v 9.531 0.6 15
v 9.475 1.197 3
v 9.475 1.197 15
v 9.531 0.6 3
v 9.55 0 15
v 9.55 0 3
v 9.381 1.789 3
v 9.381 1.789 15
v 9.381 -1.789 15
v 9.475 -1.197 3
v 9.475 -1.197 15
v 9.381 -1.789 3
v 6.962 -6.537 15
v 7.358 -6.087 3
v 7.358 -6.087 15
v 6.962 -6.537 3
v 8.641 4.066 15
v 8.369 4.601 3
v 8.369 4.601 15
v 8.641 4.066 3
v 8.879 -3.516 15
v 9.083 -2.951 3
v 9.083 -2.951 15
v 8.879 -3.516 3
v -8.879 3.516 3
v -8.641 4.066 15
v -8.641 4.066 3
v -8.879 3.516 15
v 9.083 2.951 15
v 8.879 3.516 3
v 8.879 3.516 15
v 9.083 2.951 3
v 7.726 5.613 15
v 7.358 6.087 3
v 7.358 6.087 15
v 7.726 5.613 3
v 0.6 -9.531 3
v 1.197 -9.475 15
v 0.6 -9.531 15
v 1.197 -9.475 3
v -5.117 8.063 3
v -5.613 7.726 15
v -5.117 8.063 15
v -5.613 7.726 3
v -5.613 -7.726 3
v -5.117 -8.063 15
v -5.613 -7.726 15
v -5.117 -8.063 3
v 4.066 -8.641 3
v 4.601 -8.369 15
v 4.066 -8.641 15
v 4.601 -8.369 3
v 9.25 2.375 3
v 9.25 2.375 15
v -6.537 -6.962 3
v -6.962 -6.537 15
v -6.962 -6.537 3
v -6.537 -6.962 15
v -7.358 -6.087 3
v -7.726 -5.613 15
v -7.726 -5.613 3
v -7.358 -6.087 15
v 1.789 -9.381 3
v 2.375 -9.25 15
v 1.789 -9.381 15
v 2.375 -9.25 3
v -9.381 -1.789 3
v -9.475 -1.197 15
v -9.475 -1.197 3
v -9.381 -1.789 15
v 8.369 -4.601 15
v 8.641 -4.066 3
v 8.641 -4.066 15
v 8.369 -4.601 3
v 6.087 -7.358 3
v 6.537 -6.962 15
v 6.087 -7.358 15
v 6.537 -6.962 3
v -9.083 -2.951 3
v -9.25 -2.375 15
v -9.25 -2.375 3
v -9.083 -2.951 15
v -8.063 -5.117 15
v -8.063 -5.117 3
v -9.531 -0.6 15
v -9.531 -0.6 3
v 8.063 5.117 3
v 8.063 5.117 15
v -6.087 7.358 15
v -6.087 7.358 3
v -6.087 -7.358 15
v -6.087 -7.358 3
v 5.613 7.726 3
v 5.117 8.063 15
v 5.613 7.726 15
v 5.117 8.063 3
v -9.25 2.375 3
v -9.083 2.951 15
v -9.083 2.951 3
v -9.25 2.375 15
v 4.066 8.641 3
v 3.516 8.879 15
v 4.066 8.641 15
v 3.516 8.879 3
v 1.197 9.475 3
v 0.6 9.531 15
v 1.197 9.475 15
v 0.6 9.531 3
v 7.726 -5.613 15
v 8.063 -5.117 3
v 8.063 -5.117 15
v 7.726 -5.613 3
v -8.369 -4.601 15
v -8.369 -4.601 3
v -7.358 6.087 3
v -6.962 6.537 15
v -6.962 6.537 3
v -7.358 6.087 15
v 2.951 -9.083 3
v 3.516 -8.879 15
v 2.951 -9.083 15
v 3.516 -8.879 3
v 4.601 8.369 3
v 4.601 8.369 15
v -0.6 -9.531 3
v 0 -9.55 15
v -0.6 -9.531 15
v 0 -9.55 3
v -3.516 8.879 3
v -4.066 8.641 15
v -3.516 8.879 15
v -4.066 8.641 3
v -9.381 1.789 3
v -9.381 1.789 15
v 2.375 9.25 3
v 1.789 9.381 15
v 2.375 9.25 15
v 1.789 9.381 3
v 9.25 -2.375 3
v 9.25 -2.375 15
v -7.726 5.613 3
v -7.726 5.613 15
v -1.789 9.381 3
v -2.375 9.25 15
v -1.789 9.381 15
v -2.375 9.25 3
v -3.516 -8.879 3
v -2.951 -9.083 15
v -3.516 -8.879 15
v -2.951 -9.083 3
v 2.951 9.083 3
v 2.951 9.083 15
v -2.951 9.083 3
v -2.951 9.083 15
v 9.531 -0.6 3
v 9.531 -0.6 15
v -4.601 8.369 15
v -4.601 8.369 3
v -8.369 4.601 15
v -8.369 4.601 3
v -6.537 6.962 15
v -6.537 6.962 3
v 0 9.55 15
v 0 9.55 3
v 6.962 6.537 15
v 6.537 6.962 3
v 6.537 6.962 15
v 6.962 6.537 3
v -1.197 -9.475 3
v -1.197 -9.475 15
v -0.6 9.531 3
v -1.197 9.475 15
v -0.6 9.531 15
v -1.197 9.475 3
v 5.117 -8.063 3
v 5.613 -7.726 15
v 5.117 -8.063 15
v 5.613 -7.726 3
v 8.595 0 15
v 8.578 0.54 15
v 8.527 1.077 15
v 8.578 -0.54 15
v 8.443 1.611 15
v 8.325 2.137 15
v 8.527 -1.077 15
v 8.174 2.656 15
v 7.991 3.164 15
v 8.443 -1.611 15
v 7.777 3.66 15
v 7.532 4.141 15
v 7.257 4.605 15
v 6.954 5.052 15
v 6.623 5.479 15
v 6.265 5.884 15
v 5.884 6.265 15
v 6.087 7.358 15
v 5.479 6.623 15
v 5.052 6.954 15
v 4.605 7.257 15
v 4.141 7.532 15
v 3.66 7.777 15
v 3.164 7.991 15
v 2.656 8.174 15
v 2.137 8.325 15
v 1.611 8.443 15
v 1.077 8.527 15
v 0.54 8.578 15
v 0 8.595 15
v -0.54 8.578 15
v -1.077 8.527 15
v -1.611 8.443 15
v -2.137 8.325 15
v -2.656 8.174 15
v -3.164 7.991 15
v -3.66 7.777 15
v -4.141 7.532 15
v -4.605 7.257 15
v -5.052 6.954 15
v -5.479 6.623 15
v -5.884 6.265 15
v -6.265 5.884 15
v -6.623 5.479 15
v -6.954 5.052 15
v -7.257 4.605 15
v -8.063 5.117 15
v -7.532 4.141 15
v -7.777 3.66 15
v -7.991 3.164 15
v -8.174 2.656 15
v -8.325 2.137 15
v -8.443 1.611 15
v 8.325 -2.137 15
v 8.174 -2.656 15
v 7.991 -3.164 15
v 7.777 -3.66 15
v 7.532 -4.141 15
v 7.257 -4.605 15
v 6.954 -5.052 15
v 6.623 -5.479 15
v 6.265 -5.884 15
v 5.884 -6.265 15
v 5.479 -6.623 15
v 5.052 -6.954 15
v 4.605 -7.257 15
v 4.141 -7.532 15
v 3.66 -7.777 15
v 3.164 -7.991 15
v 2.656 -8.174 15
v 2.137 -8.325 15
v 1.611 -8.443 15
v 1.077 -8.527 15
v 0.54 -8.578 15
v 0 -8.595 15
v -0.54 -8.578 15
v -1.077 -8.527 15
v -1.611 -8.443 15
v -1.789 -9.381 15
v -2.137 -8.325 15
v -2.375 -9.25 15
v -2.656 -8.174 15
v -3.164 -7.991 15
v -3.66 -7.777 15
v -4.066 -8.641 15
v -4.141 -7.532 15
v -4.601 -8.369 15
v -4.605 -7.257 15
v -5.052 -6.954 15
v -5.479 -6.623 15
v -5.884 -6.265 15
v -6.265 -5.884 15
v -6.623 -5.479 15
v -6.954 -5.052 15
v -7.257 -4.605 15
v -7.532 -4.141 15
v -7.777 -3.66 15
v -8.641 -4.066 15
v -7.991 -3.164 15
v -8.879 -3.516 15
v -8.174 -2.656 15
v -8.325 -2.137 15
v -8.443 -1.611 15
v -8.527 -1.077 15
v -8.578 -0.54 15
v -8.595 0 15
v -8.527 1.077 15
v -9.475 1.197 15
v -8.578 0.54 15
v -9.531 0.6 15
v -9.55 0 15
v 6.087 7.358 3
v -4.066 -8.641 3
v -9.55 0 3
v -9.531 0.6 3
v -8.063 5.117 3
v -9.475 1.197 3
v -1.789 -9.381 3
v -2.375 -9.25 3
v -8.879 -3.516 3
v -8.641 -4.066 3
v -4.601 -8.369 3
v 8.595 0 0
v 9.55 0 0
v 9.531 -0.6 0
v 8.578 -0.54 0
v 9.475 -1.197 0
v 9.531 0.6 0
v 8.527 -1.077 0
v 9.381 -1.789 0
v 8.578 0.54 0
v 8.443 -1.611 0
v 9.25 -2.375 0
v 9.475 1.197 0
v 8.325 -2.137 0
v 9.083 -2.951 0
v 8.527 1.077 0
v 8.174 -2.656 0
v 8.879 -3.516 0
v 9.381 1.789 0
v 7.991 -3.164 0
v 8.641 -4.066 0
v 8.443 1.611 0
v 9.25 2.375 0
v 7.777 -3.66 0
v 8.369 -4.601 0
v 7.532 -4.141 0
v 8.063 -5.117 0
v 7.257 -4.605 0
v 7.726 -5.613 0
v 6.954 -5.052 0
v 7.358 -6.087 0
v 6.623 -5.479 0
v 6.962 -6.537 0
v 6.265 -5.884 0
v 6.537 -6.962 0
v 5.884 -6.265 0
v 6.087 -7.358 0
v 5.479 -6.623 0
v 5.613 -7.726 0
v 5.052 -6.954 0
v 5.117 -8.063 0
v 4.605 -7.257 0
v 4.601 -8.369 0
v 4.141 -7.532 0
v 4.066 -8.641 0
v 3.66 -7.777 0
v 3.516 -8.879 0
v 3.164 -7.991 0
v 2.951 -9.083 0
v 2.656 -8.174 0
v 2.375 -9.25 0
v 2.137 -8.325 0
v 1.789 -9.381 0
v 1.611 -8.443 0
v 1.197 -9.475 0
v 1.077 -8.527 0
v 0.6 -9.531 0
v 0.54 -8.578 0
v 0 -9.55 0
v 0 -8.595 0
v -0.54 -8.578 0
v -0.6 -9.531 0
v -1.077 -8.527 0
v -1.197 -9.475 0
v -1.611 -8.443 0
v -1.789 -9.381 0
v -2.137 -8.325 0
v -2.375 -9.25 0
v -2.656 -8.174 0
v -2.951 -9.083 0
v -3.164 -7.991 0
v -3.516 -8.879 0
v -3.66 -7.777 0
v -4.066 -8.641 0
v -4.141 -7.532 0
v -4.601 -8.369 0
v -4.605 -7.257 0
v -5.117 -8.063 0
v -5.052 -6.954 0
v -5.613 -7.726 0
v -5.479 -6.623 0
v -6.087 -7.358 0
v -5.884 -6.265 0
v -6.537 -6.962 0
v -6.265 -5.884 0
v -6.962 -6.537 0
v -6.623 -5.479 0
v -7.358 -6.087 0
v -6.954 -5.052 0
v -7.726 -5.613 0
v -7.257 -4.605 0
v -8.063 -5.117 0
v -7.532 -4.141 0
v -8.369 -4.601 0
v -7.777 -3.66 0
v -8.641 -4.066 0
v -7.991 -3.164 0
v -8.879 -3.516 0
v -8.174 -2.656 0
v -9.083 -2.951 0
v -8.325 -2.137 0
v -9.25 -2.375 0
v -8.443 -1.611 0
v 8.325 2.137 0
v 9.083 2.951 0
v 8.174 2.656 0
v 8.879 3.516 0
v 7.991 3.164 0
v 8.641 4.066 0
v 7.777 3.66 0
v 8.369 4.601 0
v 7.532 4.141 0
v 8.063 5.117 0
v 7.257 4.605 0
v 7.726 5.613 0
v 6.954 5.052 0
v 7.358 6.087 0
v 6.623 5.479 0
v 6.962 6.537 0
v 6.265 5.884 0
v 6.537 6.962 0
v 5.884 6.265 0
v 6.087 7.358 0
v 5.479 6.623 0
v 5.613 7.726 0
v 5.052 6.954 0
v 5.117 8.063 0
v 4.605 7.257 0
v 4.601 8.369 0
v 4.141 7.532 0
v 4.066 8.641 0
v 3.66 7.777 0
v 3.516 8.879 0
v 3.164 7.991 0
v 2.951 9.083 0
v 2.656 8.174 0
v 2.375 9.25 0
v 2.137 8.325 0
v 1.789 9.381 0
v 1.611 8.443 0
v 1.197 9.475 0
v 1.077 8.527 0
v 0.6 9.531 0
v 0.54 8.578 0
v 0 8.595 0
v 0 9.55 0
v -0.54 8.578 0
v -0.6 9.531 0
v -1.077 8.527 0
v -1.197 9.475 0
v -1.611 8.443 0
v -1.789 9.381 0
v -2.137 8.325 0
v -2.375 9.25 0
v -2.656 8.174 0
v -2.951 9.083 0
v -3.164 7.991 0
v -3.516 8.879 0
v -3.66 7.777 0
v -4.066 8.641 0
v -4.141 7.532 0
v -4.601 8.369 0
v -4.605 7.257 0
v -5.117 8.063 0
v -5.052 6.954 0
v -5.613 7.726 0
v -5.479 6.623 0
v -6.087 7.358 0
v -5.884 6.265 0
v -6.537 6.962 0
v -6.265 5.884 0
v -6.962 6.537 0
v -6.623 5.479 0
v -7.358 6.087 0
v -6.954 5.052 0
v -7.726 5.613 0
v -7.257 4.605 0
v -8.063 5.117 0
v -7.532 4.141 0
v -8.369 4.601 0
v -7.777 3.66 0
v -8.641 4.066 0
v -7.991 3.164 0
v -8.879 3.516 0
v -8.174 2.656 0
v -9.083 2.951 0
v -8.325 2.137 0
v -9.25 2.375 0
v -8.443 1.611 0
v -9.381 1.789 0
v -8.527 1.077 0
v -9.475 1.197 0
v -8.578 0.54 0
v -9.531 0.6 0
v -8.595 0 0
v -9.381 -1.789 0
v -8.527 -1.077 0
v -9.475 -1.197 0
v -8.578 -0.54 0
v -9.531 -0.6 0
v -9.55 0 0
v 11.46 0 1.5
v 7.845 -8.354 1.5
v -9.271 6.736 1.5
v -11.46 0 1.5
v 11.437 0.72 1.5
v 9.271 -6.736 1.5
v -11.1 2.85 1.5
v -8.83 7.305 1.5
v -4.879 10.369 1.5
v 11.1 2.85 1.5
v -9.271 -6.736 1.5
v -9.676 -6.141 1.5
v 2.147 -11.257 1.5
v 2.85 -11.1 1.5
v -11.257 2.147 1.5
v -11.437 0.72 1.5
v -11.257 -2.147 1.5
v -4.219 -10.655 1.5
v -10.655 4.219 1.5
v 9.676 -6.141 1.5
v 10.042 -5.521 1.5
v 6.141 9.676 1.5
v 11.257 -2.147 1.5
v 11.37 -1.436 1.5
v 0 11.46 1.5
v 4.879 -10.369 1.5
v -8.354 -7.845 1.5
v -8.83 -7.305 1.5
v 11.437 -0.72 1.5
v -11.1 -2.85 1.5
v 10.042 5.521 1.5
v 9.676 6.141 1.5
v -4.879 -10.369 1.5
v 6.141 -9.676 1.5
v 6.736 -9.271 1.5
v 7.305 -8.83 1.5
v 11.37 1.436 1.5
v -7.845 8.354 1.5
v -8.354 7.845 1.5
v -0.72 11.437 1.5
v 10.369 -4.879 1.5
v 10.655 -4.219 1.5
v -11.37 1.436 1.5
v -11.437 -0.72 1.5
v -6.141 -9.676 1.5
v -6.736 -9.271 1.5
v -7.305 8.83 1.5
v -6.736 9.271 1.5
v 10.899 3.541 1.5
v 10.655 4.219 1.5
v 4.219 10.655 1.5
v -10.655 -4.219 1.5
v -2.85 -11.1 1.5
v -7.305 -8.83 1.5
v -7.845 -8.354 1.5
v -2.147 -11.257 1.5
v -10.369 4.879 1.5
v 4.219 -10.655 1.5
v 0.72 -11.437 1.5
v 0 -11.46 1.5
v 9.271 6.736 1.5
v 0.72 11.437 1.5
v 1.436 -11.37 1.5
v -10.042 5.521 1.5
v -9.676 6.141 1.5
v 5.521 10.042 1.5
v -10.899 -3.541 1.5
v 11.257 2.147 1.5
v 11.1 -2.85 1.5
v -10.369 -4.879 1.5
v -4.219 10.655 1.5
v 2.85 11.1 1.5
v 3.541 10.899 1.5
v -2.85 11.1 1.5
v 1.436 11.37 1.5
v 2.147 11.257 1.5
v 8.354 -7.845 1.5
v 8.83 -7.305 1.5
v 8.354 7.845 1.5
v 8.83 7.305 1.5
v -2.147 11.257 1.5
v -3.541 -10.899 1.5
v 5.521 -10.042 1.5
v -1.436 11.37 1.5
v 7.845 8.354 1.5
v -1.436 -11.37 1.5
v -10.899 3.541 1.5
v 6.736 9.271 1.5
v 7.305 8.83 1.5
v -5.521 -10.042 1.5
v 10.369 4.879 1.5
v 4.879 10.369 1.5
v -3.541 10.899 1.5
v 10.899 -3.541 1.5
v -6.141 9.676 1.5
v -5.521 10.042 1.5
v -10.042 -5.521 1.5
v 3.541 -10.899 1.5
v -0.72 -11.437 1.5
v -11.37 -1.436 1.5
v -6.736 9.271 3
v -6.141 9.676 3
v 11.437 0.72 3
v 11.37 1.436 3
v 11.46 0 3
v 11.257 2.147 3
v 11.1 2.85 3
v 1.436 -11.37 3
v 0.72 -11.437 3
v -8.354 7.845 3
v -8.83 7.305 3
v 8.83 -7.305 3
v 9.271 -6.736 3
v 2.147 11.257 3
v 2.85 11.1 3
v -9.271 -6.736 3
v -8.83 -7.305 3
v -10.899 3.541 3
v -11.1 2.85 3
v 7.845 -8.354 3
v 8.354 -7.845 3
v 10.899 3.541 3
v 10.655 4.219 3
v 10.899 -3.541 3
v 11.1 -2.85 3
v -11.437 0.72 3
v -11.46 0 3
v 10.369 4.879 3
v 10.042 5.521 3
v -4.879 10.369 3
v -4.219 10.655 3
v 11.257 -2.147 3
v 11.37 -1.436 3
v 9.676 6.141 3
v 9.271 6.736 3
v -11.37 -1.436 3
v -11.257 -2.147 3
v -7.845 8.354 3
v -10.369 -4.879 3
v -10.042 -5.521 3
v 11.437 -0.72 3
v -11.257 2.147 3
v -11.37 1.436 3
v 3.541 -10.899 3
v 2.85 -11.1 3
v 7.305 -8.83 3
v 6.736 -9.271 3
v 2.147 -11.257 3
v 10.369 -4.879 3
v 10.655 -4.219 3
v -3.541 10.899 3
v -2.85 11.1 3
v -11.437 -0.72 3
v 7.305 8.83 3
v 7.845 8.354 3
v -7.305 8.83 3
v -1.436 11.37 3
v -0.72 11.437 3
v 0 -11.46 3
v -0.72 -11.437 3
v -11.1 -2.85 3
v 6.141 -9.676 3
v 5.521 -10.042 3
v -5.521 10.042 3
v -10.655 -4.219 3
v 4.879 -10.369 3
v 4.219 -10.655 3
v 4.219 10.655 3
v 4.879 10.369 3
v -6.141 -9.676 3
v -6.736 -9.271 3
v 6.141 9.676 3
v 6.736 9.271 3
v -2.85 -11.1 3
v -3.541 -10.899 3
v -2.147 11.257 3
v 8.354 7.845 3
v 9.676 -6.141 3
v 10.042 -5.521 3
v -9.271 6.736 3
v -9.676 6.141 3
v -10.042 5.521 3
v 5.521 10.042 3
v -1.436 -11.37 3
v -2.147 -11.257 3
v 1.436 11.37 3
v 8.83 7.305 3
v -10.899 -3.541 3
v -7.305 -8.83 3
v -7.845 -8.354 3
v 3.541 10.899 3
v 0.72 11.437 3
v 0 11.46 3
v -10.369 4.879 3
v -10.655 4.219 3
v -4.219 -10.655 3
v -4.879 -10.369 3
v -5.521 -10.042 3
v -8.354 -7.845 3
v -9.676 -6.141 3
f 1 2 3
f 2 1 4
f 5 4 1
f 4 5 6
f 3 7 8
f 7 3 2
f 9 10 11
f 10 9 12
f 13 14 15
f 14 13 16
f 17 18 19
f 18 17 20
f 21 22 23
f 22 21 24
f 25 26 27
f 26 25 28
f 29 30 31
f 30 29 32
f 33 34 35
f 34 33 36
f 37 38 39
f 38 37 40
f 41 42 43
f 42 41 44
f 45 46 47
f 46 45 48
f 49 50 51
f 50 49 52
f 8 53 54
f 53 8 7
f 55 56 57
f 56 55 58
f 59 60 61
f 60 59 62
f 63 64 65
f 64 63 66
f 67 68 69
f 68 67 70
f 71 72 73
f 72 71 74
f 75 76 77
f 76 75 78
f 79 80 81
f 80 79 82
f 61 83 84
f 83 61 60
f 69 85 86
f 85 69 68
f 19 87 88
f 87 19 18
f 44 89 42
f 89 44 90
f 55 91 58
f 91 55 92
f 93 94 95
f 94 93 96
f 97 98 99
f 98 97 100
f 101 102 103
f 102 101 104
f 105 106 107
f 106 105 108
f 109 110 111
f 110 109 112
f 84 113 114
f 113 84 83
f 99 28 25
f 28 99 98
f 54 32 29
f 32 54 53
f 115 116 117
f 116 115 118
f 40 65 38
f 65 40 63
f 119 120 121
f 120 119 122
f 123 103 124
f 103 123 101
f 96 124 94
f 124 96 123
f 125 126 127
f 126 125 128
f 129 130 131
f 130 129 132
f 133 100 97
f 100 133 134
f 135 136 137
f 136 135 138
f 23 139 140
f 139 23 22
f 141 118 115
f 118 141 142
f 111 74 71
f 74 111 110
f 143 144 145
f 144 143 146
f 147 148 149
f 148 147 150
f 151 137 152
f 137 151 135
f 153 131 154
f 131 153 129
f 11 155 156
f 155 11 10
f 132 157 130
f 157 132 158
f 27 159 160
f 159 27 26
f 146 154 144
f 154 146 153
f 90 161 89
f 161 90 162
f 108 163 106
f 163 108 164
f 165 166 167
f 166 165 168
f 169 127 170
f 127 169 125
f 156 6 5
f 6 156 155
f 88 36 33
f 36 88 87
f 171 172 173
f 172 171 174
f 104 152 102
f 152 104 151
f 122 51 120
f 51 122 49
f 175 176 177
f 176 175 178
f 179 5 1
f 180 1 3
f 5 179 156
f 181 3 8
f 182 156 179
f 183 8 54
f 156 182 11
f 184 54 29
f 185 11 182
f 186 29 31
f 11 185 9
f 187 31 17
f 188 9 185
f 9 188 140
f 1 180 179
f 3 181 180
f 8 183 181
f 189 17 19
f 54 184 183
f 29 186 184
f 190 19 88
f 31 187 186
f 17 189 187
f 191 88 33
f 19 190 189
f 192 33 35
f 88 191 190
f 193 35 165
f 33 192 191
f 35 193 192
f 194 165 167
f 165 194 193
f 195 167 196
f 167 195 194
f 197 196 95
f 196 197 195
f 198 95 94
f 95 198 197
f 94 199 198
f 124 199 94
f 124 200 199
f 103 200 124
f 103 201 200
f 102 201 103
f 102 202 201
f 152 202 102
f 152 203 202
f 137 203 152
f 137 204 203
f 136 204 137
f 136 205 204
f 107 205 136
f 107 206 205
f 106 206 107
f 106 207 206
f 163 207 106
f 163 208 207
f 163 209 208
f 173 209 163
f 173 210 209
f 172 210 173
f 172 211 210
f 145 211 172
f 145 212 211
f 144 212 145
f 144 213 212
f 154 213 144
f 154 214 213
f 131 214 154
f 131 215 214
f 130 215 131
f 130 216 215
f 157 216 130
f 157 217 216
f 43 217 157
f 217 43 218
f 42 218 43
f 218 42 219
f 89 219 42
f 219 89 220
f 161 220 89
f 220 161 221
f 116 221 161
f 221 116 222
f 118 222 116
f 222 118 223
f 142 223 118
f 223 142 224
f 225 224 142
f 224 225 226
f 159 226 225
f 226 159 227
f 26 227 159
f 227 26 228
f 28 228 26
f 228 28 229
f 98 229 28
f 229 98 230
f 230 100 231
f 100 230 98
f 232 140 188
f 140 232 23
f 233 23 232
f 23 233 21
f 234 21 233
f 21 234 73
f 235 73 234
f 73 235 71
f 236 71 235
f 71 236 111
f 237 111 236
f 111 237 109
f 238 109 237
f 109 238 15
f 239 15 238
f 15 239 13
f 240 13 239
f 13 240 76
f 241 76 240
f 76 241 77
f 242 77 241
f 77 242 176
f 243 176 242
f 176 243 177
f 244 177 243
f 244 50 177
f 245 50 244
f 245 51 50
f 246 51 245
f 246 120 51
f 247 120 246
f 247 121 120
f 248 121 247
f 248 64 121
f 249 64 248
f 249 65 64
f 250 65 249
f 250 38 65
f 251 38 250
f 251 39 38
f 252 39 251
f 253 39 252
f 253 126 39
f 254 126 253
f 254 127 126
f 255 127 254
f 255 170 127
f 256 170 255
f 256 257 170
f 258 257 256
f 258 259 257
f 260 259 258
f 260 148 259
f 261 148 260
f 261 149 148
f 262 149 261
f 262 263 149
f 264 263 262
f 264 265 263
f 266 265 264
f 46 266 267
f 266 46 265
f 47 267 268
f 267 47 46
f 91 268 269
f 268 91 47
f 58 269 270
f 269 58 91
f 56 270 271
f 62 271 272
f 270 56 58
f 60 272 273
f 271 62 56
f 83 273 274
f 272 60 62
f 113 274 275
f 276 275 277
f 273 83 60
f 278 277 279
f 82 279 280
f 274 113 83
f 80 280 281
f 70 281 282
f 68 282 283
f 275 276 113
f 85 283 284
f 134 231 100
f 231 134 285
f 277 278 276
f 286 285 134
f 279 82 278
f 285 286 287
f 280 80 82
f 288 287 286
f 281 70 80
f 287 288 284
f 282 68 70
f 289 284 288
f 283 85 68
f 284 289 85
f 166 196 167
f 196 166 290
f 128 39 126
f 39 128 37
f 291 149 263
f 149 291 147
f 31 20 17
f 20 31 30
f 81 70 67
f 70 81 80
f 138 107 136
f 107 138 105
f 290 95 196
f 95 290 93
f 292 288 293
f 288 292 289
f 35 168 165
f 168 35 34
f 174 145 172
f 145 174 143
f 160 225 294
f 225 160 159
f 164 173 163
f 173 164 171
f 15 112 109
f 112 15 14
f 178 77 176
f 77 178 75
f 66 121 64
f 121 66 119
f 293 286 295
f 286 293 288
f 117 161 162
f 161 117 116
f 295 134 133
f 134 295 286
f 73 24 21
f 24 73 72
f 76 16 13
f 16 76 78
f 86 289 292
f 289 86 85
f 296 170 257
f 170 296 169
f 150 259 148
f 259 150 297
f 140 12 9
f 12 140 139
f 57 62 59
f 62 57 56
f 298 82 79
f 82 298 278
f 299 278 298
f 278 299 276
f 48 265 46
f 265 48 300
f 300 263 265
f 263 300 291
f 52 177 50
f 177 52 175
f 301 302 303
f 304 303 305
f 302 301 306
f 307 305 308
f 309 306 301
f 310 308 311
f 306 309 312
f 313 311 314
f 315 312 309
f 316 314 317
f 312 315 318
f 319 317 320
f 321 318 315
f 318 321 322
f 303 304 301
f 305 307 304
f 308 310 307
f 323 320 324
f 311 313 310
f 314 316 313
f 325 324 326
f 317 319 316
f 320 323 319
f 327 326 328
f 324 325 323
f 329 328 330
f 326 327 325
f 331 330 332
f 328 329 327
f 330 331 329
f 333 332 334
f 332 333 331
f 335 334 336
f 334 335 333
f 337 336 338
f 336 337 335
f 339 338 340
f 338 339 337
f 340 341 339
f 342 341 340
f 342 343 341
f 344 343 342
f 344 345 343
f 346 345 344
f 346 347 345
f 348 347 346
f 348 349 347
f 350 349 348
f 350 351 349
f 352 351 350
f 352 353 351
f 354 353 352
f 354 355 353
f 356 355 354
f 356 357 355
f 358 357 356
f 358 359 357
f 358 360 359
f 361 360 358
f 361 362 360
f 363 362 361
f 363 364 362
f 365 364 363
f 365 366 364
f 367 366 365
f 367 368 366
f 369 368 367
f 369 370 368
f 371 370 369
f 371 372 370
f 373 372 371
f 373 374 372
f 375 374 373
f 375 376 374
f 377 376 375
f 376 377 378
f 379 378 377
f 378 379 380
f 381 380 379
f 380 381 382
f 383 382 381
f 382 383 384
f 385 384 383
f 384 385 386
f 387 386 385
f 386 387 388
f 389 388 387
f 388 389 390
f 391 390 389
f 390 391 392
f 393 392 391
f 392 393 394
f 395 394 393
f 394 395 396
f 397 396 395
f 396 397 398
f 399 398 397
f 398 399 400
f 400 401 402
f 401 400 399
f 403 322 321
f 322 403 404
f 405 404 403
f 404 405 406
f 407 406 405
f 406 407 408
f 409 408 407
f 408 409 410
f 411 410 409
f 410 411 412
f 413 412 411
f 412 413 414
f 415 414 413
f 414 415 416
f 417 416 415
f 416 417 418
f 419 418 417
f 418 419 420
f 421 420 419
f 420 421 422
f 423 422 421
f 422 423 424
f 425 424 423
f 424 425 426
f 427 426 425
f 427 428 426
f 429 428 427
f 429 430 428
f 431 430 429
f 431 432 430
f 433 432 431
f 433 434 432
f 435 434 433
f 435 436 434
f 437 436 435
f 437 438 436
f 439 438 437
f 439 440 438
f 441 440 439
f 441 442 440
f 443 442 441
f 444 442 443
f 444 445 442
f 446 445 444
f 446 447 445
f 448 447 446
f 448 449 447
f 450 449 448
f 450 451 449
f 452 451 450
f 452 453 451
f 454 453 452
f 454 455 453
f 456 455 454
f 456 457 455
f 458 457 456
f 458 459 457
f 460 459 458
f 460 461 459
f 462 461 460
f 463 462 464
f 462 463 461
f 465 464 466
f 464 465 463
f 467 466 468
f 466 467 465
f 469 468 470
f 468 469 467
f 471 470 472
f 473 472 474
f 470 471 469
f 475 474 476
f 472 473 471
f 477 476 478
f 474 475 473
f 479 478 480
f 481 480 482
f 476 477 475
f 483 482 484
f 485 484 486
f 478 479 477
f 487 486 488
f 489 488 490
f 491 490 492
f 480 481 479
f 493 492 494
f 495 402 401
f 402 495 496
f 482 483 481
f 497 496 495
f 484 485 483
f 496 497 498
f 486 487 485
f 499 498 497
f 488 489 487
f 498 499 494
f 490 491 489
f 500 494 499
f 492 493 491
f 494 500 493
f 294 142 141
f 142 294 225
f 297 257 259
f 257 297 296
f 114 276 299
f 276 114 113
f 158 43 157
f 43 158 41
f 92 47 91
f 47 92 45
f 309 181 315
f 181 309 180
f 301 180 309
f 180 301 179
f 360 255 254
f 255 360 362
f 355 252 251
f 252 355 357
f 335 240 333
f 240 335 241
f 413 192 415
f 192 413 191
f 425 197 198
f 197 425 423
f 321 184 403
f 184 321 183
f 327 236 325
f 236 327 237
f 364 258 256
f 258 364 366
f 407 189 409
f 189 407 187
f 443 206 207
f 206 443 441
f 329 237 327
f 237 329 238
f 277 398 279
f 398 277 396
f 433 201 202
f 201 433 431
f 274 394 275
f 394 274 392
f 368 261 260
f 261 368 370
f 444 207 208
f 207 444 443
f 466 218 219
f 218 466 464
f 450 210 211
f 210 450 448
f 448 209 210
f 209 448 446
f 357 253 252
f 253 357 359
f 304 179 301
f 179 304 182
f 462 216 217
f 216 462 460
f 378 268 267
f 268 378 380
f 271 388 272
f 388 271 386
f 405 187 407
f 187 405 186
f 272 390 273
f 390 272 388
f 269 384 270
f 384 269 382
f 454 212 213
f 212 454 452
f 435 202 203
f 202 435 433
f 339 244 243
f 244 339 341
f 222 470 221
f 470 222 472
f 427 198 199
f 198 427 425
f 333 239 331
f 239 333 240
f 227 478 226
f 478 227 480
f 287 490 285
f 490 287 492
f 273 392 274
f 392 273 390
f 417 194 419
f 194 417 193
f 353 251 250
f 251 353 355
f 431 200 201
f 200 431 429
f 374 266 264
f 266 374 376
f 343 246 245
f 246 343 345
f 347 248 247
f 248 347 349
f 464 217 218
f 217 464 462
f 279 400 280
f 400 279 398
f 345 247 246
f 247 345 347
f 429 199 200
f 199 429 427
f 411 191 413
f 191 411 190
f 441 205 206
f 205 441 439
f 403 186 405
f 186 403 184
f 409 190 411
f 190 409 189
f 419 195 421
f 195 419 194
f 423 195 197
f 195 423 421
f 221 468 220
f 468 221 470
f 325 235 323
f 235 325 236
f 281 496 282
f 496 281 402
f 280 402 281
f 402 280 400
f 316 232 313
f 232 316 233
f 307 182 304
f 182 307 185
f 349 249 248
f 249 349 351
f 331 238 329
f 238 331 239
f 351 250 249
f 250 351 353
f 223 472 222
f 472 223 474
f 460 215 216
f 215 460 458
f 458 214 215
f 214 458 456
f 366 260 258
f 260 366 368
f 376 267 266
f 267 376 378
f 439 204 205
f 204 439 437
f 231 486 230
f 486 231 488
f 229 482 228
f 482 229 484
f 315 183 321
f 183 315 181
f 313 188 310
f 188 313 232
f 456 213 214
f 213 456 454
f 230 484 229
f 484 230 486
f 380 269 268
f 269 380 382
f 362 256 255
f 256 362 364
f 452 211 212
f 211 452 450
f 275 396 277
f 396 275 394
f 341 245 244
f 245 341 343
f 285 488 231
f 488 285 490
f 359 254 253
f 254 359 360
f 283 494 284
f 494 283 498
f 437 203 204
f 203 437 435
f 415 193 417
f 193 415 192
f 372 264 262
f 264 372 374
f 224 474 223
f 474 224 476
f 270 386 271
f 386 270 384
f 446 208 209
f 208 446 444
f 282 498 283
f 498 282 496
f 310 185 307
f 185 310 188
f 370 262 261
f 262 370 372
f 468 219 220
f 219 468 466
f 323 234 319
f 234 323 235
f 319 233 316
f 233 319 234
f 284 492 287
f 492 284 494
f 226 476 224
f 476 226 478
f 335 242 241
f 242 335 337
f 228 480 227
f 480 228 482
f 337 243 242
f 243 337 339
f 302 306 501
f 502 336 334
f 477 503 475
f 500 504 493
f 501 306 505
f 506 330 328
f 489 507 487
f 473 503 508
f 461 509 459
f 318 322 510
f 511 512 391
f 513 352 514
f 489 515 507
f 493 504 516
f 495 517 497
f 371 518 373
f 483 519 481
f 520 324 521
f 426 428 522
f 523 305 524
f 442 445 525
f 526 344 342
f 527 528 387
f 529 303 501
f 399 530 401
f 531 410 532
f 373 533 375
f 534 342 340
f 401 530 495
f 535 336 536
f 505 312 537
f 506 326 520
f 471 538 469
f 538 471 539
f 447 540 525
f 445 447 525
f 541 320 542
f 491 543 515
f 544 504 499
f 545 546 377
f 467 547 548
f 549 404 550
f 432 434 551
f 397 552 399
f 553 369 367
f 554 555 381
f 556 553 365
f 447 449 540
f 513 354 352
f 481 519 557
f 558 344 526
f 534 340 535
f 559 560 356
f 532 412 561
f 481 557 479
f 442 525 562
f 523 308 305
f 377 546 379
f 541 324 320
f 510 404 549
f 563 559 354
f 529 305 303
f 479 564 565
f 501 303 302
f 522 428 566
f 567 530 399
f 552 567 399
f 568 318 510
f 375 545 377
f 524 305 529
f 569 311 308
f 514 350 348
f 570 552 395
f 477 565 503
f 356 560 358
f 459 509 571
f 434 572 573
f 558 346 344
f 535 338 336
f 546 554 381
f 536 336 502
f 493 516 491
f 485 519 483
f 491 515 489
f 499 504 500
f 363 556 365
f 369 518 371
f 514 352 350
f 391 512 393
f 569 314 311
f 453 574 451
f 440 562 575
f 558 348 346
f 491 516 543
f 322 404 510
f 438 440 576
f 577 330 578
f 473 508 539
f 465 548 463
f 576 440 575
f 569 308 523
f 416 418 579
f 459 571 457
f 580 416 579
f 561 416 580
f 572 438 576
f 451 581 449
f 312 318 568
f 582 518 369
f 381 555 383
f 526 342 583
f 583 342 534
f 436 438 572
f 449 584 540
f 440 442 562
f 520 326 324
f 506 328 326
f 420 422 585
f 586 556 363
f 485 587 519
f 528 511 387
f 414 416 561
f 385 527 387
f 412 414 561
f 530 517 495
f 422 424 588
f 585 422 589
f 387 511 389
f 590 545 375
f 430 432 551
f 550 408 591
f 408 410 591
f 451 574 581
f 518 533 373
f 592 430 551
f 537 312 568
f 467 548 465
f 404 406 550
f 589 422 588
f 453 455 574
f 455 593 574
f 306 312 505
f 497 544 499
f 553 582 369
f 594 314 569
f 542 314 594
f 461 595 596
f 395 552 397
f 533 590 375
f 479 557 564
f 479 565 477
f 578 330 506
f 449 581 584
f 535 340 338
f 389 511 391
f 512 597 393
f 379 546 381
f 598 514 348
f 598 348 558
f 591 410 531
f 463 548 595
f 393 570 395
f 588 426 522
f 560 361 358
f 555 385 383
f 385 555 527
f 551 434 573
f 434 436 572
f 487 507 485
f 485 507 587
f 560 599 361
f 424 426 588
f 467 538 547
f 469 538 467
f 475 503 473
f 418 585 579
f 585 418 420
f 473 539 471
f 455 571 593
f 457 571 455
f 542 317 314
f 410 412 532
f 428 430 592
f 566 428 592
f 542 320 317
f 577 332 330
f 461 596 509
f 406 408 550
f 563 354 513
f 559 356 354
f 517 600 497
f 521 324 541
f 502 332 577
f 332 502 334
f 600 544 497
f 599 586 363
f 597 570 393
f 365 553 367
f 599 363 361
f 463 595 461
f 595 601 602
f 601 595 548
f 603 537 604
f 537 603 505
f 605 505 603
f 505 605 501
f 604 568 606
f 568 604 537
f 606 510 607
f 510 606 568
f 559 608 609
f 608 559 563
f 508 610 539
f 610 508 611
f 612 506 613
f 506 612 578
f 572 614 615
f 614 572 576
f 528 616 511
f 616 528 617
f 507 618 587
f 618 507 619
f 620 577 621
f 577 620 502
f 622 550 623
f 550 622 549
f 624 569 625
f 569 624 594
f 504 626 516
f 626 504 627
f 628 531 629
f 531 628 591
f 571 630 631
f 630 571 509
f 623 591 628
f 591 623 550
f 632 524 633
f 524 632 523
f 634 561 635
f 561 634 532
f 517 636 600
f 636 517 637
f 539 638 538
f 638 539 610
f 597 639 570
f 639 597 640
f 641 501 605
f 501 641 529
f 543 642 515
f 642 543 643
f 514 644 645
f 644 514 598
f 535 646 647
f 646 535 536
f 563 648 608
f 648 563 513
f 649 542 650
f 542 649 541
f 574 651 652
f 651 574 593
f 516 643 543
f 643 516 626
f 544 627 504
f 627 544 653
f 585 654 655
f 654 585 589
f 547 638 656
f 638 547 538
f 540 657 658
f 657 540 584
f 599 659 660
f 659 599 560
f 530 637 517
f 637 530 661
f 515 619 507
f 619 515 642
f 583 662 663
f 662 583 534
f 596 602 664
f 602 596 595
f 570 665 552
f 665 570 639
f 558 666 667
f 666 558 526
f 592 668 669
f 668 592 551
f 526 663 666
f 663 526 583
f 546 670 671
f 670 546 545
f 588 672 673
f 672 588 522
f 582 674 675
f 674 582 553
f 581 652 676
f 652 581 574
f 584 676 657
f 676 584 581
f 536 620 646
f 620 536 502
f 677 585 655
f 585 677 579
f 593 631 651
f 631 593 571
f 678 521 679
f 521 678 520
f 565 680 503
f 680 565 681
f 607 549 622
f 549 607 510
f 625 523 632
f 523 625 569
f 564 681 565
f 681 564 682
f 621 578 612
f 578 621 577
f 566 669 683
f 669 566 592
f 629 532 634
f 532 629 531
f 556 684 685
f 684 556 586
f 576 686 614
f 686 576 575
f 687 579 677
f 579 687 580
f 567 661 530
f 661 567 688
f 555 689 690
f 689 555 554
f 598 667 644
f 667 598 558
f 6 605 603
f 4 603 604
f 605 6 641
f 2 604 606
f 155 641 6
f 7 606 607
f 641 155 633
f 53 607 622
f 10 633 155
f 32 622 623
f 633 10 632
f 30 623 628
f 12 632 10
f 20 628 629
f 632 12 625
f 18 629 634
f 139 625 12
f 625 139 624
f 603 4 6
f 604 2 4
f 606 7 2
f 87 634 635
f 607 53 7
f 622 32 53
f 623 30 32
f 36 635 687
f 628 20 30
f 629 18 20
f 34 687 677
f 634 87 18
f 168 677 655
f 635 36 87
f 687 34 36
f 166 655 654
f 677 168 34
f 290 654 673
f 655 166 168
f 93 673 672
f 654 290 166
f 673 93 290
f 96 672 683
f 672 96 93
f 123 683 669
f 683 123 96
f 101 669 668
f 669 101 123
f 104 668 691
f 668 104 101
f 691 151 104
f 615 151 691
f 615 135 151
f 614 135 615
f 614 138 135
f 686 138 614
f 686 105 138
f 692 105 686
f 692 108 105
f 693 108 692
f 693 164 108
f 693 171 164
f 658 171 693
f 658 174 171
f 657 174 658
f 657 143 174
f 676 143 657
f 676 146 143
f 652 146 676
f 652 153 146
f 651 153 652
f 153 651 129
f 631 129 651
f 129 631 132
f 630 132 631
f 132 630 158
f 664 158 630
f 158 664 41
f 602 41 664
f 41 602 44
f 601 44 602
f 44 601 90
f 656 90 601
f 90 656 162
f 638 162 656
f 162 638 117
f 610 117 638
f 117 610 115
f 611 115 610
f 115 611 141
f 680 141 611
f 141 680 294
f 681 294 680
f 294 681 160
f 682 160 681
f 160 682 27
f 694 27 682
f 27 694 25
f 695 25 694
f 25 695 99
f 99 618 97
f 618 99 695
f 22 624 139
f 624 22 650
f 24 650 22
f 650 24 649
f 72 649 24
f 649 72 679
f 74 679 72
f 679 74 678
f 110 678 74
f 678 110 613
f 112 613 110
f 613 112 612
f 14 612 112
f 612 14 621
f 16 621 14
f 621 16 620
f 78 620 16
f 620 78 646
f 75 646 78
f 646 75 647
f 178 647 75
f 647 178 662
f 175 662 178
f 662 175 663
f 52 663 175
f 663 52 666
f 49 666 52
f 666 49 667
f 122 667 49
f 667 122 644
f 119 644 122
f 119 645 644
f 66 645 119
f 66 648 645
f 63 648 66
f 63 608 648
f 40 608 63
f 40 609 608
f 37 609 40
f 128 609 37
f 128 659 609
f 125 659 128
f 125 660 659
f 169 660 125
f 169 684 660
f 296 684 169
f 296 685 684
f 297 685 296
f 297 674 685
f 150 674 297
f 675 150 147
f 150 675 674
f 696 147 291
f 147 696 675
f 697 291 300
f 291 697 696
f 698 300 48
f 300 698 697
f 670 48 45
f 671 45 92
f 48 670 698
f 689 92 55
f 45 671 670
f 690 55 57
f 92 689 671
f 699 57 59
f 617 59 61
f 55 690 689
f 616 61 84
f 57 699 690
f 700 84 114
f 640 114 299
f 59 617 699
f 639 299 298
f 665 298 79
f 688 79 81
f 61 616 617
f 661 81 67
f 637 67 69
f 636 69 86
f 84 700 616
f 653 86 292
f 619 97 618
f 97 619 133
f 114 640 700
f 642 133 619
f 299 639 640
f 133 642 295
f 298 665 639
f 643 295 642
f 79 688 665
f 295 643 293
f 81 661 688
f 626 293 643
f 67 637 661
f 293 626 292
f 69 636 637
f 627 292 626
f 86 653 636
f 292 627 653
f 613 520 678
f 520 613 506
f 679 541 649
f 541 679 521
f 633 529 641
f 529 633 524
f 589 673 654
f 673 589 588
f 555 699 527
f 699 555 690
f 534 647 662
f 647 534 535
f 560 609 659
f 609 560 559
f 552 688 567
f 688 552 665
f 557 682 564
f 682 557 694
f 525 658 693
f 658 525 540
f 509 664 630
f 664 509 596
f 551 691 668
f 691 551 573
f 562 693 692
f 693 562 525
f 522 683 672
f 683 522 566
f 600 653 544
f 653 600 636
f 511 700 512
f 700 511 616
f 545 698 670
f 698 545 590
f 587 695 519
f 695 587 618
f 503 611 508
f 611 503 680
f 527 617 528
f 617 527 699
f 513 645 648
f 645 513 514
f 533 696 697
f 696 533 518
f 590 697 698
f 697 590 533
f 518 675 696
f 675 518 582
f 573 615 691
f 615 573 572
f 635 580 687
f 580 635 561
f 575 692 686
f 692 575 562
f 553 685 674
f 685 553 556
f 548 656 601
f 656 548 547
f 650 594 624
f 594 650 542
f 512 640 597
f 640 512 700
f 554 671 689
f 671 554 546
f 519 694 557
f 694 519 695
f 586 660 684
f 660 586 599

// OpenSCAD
$fn = 100;
outer = 19.1; // 3/4"
inner = outer * .9;
length = 15;

//main tube
difference() {
  //outer tube
  cylinder(d = outer, h = length);
  //inner tube
  cylinder(d = inner, h = length);
}

//taper
difference() {
  //outer taper
  cylinder(h = length * 0.1, d2 = outer * 1.2, d1 = outer);
  //inner taper
  cylinder(d = inner, h = length);
}

//collar
translate([0,0,length * 0.1]) {
  color("red")
  difference() {
    //outer tube
    cylinder(d = outer * 1.2, h = length * 0.1);
    //inner tube
    cylinder(d = inner, h = length * 0.1);
  }
}
